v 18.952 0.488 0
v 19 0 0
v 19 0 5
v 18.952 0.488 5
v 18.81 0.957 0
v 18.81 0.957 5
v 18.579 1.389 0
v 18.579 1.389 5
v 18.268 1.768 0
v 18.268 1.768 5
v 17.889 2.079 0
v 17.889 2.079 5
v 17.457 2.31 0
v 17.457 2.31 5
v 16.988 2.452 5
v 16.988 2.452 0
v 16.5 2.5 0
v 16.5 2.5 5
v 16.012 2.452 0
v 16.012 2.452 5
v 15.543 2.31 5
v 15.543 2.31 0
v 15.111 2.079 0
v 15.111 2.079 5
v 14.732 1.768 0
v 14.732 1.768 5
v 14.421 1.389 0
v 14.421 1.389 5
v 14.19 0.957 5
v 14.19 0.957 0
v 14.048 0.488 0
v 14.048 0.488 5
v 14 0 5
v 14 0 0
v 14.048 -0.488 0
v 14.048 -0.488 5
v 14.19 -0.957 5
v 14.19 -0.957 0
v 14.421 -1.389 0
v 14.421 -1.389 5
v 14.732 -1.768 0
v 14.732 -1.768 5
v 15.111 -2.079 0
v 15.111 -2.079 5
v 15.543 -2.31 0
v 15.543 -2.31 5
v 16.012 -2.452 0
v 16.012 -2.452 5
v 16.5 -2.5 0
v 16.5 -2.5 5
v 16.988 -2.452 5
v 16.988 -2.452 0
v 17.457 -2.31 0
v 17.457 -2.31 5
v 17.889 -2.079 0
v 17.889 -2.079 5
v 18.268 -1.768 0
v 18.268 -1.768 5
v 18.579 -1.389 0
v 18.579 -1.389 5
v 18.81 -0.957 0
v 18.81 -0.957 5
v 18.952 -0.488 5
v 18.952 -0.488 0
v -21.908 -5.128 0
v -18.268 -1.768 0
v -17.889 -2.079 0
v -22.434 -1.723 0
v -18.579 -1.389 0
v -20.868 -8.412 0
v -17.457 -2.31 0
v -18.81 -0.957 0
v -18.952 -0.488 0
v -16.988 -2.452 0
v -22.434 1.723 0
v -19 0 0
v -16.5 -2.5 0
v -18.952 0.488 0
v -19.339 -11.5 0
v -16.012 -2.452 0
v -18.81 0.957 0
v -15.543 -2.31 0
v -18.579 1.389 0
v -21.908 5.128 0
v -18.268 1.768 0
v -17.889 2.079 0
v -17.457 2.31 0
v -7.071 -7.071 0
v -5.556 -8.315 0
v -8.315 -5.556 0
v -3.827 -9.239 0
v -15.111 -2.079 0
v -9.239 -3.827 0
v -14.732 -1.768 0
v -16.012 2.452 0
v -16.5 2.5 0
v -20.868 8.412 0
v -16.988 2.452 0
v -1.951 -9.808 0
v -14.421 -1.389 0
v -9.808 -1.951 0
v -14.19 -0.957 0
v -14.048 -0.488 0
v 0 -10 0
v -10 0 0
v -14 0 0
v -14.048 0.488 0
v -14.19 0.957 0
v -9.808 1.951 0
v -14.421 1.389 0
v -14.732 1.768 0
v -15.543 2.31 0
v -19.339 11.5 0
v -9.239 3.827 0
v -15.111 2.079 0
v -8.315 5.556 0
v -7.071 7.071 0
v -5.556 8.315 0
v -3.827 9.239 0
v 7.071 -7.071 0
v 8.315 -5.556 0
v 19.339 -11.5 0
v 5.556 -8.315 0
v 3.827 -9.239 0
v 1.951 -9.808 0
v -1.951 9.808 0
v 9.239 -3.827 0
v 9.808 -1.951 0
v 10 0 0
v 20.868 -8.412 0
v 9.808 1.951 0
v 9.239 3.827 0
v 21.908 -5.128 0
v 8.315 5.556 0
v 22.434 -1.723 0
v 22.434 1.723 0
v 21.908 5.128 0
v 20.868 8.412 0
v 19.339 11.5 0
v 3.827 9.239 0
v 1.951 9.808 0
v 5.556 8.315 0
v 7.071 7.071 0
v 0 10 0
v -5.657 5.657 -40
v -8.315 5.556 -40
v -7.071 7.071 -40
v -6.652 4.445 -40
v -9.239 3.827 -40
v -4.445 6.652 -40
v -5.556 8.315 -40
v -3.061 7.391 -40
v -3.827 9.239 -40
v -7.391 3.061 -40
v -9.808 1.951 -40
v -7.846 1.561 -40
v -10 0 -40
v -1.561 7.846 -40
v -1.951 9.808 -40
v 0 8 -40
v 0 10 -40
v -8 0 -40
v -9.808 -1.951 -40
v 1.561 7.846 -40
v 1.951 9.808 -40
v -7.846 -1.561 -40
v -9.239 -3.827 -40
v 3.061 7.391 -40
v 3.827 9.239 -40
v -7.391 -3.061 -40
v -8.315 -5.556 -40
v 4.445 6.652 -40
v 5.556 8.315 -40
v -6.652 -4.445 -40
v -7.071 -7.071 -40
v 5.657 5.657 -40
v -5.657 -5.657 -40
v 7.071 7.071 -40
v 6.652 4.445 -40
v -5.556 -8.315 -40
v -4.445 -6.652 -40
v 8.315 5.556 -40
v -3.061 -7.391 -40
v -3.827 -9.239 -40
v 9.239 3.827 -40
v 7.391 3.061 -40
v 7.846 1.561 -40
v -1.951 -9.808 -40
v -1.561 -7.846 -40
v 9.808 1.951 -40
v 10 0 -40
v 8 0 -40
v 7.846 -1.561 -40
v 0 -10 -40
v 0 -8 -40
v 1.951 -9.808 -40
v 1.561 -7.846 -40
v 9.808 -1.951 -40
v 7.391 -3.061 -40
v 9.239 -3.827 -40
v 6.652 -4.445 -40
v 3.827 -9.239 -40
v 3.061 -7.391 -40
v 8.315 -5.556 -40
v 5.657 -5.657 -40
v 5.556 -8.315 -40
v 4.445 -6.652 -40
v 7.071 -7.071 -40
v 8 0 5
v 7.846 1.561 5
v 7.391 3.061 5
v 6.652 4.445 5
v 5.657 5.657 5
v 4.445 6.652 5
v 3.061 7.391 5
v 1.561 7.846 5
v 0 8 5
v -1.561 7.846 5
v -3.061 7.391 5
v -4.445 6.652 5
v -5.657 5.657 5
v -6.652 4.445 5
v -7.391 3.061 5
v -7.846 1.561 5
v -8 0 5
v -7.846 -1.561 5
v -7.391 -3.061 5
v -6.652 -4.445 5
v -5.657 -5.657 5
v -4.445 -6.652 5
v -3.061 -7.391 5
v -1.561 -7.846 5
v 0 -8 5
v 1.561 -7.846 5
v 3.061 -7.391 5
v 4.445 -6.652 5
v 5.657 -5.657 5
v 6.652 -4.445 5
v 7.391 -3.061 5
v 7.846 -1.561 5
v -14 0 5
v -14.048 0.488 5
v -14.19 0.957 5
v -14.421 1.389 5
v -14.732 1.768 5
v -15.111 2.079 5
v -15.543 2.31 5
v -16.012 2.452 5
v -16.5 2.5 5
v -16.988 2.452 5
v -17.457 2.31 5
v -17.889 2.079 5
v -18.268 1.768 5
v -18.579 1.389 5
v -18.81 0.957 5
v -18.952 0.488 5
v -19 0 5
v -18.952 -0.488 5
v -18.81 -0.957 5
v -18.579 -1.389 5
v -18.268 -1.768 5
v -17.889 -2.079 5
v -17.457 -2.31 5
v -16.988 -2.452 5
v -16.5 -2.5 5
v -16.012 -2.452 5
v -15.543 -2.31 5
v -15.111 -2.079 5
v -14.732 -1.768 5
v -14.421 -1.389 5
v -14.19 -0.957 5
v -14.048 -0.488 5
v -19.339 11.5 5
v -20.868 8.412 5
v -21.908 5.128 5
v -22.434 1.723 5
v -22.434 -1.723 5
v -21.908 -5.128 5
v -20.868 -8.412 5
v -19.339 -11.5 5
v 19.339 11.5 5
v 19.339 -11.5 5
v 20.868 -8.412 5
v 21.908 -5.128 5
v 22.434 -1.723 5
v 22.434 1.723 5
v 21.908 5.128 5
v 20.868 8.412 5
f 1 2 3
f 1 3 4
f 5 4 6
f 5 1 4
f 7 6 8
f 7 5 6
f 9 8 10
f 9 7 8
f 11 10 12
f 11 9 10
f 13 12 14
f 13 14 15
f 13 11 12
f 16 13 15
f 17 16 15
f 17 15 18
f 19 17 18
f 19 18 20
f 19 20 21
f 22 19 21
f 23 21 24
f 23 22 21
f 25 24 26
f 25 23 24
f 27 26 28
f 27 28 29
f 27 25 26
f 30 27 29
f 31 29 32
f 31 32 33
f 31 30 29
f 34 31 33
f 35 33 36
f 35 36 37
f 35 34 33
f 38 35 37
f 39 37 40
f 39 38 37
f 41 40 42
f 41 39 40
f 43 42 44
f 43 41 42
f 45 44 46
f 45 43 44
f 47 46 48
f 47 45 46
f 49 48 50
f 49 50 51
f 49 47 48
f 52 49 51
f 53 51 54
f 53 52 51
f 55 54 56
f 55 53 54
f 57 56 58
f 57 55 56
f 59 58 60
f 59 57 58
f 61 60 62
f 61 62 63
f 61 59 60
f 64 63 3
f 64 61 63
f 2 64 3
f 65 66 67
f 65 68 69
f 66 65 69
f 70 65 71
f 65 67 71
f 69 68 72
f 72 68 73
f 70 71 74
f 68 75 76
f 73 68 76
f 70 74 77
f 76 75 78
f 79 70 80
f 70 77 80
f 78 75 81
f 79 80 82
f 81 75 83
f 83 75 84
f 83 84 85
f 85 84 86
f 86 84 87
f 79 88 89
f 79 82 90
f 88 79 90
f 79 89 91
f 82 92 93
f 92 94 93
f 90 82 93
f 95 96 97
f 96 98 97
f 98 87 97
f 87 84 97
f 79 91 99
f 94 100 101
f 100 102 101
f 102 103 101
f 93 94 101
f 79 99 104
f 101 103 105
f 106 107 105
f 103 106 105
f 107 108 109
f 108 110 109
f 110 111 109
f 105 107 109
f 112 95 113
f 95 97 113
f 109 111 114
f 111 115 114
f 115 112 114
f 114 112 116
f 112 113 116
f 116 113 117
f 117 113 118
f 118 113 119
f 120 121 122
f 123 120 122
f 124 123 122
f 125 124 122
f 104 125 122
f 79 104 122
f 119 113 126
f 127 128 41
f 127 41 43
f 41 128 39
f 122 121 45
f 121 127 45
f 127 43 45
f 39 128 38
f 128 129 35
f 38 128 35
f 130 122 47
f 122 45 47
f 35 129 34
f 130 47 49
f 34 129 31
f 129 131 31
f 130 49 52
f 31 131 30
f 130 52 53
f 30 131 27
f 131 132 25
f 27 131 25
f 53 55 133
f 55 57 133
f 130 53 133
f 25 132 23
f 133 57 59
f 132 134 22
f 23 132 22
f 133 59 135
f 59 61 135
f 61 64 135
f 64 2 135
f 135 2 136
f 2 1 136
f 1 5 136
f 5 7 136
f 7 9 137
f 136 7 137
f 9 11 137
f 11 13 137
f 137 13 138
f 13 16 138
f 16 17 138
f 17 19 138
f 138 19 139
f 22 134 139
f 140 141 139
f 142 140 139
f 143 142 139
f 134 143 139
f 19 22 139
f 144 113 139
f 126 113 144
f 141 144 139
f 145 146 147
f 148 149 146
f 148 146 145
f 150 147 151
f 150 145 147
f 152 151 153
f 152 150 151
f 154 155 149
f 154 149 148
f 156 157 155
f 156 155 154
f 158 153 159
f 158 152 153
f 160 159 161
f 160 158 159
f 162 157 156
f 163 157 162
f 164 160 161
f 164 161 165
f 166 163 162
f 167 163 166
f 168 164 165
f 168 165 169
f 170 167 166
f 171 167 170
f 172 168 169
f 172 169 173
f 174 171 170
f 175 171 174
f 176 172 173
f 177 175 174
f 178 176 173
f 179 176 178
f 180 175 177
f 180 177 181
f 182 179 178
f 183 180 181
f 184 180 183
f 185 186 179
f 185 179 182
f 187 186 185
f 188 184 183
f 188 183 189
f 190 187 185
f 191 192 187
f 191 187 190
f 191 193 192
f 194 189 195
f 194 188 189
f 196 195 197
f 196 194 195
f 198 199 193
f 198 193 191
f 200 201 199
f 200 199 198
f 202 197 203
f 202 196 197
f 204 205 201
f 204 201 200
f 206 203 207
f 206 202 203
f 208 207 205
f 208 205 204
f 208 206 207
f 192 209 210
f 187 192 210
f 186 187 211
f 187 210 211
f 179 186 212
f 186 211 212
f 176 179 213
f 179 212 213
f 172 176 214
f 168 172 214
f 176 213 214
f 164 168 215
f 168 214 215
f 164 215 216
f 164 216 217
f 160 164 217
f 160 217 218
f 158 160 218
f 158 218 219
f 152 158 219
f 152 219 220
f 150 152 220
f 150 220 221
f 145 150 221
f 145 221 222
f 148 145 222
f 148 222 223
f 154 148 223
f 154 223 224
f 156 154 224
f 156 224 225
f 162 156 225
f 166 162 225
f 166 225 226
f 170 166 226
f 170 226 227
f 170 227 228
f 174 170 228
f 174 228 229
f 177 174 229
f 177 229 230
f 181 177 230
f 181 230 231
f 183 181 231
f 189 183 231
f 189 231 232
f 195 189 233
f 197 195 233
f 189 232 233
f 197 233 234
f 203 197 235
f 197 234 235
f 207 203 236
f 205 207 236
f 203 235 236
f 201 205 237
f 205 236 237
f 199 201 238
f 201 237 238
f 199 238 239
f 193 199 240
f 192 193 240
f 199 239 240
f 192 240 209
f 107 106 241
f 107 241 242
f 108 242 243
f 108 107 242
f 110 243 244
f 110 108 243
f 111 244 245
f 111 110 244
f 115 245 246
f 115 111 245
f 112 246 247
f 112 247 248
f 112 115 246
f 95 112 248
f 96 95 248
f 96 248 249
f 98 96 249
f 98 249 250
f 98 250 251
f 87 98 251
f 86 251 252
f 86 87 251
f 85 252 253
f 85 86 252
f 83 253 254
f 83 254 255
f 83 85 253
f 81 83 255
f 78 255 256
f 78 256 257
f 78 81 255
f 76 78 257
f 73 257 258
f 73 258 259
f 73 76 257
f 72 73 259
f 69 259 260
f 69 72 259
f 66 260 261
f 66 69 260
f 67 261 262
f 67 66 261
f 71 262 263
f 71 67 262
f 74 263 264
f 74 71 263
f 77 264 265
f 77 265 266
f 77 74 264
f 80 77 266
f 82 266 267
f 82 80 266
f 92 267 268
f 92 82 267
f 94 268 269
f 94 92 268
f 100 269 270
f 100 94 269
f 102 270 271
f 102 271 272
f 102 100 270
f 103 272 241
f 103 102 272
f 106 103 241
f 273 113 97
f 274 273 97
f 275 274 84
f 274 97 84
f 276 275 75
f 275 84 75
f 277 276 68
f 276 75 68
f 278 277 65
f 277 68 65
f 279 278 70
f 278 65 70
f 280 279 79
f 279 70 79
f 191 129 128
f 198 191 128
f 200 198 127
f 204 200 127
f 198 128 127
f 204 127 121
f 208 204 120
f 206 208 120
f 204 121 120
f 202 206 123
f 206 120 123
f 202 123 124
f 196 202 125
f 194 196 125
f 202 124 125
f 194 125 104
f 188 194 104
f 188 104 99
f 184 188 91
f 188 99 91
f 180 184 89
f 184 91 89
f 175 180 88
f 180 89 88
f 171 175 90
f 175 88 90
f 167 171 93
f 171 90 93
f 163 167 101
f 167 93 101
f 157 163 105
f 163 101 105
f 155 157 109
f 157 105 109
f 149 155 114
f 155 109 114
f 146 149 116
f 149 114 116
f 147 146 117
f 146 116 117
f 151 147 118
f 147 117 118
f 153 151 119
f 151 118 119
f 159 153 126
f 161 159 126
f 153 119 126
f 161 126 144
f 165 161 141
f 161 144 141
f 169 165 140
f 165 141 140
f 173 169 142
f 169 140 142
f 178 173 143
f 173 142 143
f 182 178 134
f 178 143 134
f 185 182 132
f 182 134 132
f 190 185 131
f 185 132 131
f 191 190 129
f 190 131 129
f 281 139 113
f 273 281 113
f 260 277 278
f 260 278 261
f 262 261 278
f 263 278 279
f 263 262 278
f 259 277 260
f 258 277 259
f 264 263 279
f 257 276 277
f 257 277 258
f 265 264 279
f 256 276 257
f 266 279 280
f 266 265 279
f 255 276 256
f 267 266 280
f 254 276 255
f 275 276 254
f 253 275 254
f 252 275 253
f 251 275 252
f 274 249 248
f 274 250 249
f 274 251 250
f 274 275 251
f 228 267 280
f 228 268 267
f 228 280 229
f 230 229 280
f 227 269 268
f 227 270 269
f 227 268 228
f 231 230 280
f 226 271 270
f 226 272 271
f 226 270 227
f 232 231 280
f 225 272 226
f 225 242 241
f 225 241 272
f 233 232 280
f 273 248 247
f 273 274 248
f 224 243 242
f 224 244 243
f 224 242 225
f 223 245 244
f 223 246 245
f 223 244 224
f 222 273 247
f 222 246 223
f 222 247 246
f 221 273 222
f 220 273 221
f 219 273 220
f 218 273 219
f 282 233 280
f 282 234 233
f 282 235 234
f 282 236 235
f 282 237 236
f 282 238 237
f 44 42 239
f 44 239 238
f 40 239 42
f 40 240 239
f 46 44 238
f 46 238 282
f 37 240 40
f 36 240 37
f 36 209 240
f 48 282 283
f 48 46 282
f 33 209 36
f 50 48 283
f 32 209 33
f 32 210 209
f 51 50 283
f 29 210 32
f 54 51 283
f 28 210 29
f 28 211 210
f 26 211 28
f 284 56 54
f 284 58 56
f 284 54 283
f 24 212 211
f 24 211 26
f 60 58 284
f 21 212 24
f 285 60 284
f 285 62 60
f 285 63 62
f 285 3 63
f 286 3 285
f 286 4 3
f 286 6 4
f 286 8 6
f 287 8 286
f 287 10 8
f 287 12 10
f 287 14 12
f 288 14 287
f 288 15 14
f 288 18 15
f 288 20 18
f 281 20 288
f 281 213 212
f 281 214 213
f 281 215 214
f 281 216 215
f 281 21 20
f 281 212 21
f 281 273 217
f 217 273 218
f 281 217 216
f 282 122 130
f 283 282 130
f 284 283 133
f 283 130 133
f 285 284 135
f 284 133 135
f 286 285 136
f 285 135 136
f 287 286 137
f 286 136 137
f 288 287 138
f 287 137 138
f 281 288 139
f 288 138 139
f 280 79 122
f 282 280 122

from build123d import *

# Parameters (mm, degrees)
SKETCH1_R           = 2.5
BOSS_EXTRUDE1_DEPTH = 5
SKETCH2_R           = 10
BOSS_EXTRUDE2_DEPTH = 40
CUT_EXTRUDE1_REACH  = 53.609
SKETCH3_R           = 8


with BuildPart() as part:
    # Sketch1 → Boss-Extrude1 (new body)
    with BuildSketch(Plane.XY):
        with BuildLine():
            Line((-19.339079606, -11.5), (19.339079606, -11.5))
            ThreePointArc((19.339079606, -11.5), (22.5, 0), (19.339079606, 11.5))
            Line((19.339079606, 11.5), (-19.339079606, 11.5))
            ThreePointArc((-19.339079606, 11.5), (-22.5, 0), (-19.339079606, -11.5))
        make_face()
        with Locations((-16.5, 0)):
            Circle(SKETCH1_R, mode=Mode.SUBTRACT)
        with Locations((16.5, 0)):
            Circle(SKETCH1_R, mode=Mode.SUBTRACT)
    extrude(amount=BOSS_EXTRUDE1_DEPTH)

    # Sketch2 → Boss-Extrude2 (add)
    with BuildSketch(Plane(origin=(0, 0, 0), x_dir=(-1, 0, 0), z_dir=(0, 0, -1))):
        with Locations(Location((0, 0, 0), (0, 0, 180))):
            Circle(SKETCH2_R)
    extrude(amount=BOSS_EXTRUDE2_DEPTH)

    # Sketch3 → Cut-Extrude1 (cut, up to next)
    with BuildSketch(Plane.XY.offset(5), mode=Mode.PRIVATE) as cut_extrude1_sk1:
        Circle(SKETCH3_R)
    cut_extrude1_tool1 = extrude(cut_extrude1_sk1.sketch, amount=-CUT_EXTRUDE1_REACH, mode=Mode.PRIVATE) & part.part
    add(cut_extrude1_tool1.solids().sort_by_distance((0, 0, 5))[0], mode=Mode.SUBTRACT)


solid = part.part
